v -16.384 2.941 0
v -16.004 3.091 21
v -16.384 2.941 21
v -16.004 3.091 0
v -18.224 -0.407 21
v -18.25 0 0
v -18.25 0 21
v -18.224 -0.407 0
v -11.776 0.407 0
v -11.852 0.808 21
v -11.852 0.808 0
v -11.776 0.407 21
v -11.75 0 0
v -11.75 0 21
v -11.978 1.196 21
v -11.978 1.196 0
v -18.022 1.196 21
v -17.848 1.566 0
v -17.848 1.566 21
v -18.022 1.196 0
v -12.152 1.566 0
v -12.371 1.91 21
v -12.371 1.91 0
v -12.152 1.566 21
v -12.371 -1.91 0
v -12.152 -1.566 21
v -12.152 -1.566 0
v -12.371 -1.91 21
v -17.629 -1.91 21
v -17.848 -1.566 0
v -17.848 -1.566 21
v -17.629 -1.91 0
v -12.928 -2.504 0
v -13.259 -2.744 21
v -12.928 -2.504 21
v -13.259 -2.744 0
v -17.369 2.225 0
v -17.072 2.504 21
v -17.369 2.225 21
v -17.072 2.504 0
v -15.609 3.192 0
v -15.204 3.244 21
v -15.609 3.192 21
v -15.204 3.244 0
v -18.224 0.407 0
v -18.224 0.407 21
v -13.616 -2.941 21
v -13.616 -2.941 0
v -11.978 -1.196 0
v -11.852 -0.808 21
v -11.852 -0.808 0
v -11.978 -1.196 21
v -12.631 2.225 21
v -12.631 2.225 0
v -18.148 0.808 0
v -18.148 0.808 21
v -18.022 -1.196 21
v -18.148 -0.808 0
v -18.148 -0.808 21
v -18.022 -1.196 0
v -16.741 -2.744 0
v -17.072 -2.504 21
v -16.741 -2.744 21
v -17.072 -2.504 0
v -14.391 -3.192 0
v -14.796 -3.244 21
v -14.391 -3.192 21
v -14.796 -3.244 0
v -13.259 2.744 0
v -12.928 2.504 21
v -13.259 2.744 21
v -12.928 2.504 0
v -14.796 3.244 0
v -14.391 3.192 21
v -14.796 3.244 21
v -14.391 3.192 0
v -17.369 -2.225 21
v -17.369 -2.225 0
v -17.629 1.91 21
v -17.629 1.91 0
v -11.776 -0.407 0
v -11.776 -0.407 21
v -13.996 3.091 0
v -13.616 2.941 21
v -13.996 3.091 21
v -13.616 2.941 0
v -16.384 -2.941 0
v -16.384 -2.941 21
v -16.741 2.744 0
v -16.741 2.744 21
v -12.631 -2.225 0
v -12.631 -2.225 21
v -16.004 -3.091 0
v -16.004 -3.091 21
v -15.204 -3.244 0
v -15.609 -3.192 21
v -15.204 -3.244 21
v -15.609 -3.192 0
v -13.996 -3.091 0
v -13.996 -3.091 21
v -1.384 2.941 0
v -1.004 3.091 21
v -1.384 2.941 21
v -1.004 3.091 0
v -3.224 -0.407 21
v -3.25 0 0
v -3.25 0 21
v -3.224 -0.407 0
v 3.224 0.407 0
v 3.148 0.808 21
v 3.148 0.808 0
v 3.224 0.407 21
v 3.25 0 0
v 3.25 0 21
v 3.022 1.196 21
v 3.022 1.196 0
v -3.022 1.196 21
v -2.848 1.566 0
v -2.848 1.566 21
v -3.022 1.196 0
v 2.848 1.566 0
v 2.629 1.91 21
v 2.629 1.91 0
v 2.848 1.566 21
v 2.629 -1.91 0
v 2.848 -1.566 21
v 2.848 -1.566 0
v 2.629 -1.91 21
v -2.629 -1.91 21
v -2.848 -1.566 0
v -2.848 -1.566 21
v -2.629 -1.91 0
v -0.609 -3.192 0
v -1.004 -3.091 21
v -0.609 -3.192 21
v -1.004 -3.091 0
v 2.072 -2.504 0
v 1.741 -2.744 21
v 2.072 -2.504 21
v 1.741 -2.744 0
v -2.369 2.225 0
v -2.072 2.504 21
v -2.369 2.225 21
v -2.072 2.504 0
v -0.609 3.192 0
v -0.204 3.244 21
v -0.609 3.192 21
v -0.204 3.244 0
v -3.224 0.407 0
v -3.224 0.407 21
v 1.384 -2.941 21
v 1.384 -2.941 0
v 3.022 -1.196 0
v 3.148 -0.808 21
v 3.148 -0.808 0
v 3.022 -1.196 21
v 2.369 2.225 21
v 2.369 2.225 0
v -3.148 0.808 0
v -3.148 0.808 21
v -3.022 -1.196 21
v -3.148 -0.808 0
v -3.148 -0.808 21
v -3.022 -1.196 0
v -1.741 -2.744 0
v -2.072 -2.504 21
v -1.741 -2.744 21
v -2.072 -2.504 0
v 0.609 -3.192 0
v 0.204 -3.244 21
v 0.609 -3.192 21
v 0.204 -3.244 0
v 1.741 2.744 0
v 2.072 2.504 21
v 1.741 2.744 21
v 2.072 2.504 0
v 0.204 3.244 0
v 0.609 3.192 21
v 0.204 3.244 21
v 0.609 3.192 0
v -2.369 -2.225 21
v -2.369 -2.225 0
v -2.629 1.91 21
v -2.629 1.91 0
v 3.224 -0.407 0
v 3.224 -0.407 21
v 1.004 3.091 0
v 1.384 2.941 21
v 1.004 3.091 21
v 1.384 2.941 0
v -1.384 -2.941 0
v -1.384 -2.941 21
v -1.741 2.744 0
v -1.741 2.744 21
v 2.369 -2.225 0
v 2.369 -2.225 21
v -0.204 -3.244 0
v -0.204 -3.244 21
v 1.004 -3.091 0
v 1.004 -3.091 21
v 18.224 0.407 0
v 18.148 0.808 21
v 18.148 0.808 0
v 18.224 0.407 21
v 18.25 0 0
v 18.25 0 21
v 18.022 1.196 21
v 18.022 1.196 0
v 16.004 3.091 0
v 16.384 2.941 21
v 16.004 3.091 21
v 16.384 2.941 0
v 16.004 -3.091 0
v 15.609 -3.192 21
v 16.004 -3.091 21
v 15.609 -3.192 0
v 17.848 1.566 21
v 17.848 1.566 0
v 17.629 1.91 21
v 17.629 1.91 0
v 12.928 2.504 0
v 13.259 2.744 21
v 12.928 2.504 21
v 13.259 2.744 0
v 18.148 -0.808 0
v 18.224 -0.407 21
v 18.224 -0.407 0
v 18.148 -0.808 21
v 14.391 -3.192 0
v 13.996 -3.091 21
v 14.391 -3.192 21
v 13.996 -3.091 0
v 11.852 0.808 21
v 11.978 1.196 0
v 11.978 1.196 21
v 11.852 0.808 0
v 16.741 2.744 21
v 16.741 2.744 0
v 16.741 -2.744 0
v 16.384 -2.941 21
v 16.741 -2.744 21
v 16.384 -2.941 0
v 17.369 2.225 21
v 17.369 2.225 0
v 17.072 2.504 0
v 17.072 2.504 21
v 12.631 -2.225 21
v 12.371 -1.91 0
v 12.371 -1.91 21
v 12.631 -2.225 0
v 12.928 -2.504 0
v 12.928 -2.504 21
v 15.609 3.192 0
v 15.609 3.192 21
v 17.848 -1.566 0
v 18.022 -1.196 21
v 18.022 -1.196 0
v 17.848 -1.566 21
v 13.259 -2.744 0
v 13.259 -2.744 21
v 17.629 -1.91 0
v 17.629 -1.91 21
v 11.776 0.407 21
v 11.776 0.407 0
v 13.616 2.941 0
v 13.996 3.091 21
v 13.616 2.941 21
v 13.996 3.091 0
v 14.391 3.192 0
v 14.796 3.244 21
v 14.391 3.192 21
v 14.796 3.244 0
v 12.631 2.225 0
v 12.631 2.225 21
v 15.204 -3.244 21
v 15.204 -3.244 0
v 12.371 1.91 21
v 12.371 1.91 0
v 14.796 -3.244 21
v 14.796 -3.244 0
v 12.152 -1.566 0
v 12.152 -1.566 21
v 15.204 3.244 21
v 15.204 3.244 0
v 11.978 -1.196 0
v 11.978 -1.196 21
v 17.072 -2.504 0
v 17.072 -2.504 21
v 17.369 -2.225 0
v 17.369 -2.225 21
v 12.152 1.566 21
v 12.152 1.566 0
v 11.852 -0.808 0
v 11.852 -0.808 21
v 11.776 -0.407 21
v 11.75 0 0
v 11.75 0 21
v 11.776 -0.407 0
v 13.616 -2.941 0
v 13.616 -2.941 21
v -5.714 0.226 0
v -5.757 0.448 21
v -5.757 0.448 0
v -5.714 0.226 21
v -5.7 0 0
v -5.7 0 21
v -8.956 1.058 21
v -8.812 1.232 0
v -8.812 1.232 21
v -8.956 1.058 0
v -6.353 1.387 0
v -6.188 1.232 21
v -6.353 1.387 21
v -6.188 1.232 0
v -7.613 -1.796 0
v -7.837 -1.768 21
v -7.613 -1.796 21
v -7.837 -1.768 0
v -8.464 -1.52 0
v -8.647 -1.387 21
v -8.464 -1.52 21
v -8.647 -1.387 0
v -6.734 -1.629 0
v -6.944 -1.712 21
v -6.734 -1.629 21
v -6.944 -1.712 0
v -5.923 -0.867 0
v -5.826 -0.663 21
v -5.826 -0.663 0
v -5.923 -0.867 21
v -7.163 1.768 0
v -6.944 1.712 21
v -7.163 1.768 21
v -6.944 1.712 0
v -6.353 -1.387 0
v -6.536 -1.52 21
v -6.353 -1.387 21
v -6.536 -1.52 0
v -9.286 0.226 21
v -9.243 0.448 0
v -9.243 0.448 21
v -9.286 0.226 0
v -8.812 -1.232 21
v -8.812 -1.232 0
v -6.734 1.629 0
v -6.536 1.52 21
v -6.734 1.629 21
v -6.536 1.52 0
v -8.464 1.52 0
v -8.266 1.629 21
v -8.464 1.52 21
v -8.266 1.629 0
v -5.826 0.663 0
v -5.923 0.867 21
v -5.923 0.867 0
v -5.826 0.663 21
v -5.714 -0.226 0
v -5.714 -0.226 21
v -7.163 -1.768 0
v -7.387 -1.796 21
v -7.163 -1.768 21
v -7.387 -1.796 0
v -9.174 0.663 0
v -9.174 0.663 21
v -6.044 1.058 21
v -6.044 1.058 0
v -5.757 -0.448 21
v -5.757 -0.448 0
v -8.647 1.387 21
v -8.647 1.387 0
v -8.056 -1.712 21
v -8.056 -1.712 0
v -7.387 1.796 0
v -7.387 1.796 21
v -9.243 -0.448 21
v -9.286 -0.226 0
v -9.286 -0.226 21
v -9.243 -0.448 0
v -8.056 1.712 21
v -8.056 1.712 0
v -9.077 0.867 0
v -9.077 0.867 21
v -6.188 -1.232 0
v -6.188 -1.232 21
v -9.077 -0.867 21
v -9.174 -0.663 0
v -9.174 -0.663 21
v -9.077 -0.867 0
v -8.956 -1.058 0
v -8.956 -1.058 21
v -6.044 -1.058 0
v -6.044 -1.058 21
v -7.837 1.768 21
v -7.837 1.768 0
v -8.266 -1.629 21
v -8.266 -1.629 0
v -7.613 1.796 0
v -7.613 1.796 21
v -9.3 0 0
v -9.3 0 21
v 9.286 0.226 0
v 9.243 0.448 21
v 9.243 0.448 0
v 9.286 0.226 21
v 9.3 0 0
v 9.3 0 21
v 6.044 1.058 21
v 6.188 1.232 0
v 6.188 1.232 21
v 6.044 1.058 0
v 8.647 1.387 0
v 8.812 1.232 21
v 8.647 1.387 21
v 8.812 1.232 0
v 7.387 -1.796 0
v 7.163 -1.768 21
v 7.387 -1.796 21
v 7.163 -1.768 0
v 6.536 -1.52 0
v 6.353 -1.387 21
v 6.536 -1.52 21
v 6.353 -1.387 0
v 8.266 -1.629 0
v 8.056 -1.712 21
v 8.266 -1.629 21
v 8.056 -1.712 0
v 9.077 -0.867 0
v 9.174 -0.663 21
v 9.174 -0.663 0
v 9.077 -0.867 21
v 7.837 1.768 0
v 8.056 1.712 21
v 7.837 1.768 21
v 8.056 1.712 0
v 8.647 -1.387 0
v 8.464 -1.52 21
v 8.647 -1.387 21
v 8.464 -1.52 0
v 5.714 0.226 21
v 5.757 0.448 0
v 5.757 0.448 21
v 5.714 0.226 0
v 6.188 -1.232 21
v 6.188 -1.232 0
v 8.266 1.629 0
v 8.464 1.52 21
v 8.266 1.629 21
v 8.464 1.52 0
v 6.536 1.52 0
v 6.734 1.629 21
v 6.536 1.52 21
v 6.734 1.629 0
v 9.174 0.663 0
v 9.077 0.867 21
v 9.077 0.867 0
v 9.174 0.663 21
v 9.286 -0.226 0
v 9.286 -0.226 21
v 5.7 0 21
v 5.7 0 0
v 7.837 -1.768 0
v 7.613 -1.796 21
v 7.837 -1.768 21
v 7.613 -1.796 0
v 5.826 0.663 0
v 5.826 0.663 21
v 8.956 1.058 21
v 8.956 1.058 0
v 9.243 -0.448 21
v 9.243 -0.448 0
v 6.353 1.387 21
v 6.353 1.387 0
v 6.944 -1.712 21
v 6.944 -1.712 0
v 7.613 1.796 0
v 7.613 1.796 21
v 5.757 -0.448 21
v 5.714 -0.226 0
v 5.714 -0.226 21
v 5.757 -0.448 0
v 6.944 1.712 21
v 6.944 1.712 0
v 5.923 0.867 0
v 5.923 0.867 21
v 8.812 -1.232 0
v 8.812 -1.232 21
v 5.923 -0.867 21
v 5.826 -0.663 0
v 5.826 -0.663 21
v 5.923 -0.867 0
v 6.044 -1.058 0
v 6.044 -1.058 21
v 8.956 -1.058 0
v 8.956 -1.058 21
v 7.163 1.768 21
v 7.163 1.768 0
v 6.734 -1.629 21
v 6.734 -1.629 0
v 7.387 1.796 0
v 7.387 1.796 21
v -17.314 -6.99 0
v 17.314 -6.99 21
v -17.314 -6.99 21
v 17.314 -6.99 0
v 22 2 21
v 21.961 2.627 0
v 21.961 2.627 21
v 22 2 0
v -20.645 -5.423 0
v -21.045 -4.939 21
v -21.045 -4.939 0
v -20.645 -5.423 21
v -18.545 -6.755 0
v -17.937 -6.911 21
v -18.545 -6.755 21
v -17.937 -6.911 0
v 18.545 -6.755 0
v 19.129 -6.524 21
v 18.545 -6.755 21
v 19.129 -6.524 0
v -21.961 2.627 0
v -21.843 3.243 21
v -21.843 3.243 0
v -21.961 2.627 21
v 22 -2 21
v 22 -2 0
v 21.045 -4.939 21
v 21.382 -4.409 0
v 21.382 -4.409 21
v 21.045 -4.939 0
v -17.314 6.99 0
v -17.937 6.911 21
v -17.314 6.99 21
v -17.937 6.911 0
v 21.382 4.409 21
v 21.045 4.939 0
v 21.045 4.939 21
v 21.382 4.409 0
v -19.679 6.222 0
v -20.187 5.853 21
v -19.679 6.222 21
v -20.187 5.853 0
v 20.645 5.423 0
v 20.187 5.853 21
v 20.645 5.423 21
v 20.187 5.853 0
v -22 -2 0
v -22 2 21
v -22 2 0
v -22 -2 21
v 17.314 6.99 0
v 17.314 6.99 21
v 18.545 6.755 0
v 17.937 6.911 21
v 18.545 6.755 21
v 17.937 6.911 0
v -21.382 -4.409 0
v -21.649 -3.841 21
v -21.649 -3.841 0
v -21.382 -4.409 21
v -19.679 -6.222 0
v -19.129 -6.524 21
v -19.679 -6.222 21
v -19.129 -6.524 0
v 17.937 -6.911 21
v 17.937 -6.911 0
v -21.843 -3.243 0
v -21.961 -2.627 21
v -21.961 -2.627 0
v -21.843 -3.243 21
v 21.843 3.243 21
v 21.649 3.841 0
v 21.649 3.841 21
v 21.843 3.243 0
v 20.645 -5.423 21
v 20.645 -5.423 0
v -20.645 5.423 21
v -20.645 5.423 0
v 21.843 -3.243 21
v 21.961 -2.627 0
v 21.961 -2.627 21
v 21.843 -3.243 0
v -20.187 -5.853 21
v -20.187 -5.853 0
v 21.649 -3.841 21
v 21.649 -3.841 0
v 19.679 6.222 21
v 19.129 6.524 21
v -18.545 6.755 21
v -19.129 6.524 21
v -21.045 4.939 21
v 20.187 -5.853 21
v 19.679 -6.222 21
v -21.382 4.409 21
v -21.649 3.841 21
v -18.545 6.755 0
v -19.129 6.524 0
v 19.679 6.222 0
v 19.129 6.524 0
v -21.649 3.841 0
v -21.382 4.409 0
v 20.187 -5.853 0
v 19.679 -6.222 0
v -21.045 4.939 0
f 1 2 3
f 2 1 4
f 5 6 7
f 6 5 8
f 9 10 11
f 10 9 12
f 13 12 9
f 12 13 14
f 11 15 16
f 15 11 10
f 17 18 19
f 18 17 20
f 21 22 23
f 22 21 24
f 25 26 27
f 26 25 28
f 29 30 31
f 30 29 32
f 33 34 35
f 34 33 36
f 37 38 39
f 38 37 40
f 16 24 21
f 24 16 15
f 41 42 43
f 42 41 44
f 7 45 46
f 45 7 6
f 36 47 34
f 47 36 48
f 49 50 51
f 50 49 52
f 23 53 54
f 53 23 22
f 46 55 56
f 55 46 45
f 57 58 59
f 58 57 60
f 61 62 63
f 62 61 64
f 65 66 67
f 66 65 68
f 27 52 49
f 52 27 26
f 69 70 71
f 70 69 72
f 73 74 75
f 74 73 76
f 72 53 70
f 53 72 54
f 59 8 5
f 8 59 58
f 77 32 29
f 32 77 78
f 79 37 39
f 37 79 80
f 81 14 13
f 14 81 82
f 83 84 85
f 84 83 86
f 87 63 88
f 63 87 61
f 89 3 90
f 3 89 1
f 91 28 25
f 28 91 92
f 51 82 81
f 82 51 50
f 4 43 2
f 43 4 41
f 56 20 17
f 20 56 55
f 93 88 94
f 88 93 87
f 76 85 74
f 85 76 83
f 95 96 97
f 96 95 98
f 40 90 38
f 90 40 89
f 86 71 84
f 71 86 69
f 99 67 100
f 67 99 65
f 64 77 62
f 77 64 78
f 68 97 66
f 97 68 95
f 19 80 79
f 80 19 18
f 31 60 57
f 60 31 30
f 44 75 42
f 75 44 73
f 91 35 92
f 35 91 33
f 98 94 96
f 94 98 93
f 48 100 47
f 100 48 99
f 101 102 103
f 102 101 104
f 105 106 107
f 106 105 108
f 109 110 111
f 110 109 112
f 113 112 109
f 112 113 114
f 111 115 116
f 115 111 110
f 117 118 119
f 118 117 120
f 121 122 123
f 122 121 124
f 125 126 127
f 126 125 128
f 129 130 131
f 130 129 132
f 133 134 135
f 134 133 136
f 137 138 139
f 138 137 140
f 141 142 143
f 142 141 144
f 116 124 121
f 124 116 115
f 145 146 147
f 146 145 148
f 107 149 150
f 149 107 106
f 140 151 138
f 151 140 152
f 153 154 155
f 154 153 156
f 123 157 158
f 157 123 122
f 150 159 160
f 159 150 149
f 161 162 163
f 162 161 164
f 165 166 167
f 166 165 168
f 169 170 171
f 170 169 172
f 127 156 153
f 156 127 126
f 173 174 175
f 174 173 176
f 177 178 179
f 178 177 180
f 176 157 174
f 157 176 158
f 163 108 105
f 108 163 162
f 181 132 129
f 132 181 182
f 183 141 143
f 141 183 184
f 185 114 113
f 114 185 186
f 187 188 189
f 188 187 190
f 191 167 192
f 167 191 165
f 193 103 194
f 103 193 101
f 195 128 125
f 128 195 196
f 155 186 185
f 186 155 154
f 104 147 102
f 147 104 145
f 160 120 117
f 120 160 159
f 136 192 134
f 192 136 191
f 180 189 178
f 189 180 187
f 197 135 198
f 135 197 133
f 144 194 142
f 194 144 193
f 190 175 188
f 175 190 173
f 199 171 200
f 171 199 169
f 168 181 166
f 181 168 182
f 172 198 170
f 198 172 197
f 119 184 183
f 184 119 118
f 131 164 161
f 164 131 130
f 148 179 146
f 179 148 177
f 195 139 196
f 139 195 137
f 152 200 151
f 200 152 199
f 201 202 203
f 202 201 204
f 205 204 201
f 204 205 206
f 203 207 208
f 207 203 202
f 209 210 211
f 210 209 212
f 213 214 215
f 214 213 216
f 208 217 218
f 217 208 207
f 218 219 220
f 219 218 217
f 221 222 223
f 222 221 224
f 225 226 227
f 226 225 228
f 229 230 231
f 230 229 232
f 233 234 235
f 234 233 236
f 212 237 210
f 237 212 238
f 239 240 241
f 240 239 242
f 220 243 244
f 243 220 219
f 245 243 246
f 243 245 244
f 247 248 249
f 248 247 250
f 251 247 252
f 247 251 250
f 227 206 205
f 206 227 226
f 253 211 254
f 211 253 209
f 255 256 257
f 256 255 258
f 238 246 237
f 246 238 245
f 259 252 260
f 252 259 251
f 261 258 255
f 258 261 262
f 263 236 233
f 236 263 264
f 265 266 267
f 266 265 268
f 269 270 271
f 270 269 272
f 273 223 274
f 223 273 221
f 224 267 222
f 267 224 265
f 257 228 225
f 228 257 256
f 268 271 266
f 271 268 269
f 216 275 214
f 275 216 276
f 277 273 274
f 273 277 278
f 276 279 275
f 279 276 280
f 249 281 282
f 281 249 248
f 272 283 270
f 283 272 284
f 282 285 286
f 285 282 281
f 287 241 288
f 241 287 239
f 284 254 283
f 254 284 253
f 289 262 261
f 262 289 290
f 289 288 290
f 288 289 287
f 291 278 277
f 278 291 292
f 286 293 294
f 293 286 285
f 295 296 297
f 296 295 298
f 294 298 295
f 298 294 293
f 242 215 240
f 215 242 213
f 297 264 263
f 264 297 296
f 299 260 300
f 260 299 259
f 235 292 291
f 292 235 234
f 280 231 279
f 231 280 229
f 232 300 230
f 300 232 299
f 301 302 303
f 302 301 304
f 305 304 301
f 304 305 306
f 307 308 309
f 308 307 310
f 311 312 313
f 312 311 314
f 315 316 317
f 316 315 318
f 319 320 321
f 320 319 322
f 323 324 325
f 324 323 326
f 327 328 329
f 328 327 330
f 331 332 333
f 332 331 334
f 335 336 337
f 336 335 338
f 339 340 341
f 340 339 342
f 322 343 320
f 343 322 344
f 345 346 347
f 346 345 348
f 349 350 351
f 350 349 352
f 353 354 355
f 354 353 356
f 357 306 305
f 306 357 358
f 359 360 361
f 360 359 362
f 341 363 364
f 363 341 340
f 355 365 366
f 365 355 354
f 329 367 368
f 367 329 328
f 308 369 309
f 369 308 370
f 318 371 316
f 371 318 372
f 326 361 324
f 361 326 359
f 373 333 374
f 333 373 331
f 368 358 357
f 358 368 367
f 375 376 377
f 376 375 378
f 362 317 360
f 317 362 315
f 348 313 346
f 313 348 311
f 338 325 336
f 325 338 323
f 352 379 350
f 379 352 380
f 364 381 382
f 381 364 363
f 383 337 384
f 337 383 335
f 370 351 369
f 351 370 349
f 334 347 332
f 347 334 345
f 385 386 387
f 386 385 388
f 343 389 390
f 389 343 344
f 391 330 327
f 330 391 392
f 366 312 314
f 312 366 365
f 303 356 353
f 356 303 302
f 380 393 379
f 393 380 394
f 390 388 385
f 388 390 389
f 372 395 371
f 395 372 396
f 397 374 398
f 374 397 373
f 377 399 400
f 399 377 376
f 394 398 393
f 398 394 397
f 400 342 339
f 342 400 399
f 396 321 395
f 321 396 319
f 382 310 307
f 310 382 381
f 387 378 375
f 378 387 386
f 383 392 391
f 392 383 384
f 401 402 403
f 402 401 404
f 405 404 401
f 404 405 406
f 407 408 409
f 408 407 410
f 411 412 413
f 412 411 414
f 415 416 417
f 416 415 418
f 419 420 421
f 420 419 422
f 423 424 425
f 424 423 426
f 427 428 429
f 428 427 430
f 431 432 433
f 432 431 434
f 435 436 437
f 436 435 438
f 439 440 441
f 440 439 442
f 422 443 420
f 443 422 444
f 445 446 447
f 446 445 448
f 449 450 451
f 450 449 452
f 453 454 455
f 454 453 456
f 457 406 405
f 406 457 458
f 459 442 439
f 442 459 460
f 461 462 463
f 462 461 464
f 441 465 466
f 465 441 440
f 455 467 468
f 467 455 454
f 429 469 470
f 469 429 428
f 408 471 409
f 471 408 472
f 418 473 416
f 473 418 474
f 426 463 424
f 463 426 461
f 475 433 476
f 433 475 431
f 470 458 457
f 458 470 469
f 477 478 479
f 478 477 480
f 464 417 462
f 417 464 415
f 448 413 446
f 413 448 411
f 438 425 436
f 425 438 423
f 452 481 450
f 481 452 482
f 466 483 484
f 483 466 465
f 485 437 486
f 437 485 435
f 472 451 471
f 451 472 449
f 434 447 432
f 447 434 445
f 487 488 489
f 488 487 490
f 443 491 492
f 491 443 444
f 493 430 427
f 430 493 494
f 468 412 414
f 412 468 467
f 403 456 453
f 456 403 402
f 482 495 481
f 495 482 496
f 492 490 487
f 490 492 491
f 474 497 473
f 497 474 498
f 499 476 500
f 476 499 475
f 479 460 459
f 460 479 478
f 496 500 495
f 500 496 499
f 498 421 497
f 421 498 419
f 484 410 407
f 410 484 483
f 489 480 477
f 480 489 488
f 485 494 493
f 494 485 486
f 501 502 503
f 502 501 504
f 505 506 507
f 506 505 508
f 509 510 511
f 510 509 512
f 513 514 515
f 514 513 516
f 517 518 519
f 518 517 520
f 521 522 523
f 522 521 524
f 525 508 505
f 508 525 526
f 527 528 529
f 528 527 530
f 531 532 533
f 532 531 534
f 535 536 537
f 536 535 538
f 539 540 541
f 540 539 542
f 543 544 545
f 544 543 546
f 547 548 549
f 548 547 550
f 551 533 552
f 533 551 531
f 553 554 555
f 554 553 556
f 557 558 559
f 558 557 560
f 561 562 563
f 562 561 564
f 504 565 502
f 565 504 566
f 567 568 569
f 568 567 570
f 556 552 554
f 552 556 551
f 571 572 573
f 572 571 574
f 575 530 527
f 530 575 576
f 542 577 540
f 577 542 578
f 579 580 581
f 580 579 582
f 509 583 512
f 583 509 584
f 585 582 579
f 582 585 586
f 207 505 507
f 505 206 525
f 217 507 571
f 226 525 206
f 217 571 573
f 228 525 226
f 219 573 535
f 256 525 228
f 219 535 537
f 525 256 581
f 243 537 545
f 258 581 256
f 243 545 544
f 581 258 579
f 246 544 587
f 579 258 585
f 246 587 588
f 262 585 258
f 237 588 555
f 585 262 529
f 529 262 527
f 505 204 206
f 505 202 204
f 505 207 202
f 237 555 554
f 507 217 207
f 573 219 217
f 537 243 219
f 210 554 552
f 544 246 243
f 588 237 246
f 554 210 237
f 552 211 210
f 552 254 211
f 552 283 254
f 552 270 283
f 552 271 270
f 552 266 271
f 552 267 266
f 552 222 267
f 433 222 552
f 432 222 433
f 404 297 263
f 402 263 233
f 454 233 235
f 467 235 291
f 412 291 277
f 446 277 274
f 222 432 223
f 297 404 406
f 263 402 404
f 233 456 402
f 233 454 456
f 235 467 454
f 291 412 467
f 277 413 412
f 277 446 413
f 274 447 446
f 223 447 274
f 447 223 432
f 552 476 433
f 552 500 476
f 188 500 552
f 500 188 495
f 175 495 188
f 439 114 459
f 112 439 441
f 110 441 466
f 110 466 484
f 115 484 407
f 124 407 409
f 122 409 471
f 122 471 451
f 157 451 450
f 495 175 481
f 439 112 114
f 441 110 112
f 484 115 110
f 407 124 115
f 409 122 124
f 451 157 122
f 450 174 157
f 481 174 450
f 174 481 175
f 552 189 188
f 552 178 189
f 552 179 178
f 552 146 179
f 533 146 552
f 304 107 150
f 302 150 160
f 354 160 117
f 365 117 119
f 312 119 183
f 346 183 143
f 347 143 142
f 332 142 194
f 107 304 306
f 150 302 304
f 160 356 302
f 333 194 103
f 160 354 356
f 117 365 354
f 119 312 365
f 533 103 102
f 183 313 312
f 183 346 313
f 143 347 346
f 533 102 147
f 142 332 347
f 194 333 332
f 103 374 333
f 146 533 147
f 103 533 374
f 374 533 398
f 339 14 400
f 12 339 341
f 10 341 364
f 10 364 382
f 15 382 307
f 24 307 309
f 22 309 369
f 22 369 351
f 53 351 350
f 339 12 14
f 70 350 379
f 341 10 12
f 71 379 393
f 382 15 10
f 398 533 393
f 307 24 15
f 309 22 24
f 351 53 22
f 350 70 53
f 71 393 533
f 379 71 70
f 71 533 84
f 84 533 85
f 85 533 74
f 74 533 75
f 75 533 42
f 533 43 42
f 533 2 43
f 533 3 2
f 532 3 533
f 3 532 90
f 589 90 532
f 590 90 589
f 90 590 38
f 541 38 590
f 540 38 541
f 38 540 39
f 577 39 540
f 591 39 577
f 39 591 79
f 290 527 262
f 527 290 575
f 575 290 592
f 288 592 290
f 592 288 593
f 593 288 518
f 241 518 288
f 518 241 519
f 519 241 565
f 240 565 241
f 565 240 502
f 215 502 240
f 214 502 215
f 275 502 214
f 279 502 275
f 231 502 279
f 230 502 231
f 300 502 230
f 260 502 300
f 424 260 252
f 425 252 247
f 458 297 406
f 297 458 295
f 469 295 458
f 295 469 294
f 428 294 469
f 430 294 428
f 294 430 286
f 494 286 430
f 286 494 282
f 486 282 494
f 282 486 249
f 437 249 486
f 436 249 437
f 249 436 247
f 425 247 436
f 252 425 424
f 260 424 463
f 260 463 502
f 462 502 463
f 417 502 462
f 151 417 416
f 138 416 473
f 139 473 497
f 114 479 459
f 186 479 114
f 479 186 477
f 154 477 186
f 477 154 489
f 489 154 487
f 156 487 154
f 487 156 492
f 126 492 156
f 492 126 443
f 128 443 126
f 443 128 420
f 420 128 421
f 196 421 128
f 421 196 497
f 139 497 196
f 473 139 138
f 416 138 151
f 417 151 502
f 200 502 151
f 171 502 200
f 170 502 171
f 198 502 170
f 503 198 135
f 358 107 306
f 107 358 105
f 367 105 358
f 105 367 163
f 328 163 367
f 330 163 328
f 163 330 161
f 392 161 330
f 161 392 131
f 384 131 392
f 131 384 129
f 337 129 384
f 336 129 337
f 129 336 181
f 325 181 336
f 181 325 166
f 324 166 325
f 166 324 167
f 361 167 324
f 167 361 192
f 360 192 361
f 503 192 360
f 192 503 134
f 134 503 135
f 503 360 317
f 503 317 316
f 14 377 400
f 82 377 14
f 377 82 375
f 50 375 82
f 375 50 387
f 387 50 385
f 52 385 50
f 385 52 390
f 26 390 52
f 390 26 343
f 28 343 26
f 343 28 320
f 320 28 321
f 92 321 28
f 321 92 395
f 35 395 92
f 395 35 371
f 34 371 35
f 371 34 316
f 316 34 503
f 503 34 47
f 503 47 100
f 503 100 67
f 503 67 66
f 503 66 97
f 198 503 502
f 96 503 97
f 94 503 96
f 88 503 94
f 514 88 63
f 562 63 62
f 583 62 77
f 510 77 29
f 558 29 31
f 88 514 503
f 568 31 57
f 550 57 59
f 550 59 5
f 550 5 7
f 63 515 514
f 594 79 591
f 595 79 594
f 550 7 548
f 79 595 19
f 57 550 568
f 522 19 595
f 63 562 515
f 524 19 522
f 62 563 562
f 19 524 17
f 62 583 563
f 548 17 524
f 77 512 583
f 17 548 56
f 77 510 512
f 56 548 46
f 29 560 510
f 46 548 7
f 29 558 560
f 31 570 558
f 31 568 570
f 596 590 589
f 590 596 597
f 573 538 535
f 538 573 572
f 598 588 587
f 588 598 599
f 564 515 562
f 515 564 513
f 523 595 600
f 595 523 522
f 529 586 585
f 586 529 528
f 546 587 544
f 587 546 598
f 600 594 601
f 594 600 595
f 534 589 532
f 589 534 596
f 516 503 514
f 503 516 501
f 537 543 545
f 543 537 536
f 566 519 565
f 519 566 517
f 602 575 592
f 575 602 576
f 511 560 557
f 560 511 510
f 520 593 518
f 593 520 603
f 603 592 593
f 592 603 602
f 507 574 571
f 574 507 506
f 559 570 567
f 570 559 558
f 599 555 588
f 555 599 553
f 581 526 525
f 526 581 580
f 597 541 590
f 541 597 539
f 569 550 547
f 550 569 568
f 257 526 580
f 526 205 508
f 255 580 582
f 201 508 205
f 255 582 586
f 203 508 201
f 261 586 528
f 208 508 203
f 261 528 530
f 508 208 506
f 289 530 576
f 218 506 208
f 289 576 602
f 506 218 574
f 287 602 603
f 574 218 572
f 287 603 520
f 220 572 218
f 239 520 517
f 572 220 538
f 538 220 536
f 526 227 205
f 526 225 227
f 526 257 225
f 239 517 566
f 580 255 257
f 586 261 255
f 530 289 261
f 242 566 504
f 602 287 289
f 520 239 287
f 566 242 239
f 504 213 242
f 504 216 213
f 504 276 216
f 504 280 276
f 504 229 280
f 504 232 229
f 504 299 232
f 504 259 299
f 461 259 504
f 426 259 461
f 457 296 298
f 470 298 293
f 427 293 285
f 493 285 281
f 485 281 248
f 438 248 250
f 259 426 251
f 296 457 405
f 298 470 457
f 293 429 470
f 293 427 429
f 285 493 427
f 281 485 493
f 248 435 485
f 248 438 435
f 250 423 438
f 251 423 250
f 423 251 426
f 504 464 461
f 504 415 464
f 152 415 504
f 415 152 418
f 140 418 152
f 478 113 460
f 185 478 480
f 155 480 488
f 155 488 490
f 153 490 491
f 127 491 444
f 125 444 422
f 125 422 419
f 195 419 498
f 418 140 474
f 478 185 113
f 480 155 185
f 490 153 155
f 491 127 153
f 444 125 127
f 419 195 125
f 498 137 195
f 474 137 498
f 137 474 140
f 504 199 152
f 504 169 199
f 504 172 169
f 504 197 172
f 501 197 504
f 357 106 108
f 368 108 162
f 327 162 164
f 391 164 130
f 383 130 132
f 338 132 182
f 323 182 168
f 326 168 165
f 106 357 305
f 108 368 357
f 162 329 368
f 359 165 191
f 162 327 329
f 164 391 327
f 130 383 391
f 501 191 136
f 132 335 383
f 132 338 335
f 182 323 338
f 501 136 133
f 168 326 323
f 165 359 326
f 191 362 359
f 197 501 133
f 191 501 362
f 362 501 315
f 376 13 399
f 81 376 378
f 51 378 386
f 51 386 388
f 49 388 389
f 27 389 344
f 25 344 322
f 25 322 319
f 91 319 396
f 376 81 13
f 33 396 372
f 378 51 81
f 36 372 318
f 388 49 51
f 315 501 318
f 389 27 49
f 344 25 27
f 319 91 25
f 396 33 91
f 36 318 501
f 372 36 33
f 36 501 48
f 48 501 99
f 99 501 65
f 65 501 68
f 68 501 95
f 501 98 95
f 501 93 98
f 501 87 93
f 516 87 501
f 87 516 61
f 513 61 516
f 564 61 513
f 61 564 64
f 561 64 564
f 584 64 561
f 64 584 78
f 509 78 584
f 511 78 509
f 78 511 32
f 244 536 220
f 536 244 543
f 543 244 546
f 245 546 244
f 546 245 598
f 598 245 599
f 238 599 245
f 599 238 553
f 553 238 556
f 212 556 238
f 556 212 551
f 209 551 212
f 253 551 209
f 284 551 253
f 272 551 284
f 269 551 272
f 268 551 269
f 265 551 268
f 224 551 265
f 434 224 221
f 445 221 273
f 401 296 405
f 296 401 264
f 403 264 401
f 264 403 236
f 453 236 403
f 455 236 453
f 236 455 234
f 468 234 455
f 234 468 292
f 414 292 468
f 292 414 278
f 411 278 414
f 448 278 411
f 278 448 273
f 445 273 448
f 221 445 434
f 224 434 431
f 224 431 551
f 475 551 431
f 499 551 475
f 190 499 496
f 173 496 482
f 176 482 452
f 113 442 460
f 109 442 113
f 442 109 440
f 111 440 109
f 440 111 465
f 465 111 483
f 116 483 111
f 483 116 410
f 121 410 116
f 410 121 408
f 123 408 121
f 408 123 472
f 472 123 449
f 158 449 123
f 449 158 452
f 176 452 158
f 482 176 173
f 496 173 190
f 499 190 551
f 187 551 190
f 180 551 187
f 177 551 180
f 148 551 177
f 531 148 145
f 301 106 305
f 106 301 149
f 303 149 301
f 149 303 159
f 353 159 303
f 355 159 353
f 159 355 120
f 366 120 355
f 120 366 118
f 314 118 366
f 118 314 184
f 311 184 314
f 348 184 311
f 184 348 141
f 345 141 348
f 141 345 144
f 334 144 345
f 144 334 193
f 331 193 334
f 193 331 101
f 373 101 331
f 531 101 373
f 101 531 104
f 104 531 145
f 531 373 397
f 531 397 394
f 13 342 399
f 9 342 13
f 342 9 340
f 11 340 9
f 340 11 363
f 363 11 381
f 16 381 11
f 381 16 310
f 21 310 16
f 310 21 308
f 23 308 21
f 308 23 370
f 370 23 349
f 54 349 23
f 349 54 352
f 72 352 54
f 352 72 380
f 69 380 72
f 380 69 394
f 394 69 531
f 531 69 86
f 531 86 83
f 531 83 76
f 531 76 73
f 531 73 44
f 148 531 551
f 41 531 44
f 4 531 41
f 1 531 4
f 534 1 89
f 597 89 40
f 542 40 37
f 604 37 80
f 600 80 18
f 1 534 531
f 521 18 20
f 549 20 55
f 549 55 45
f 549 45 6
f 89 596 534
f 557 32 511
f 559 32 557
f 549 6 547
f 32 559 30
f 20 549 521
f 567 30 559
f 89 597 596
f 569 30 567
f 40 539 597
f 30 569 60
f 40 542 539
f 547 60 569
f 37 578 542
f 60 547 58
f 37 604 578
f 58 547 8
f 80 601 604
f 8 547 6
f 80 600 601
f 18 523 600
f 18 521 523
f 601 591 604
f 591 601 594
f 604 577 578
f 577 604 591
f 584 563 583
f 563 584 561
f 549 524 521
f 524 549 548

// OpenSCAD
$fn = 50;


difference() {
	union() {
		hull() {
			translate(v = [-17.0000000000, 2.0000000000, 0]) {
				cylinder(h = 21, r = 5);
			}
			translate(v = [17.0000000000, 2.0000000000, 0]) {
				cylinder(h = 21, r = 5);
			}
			translate(v = [-17.0000000000, -2.0000000000, 0]) {
				cylinder(h = 21, r = 5);
			}
			translate(v = [17.0000000000, -2.0000000000, 0]) {
				cylinder(h = 21, r = 5);
			}
		}
	}
	union() {
		translate(v = [-15.0000000000, 0.0000000000, 0]) {
			translate(v = [0, 0, -100]) {
				cylinder(h = 200, r = 3.2500000000);
			}
		}
		translate(v = [0, 0, -100]) {
			cylinder(h = 200, r = 3.2500000000);
		}
		translate(v = [15.0000000000, 0.0000000000, 0]) {
			translate(v = [0, 0, -100]) {
				cylinder(h = 200, r = 3.2500000000);
			}
		}
		translate(v = [-15.0000000000, 0.0000000000, 0]) {
			translate(v = [0, 0, -100]) {
				cylinder(h = 200, r = 1.8000000000);
			}
		}
		translate(v = [-7.5000000000, 0.0000000000, 0]) {
			translate(v = [0, 0, -100]) {
				cylinder(h = 200, r = 1.8000000000);
			}
		}
		translate(v = [0, 0, -100]) {
			cylinder(h = 200, r = 1.8000000000);
		}
		translate(v = [7.5000000000, 0.0000000000, 0]) {
			translate(v = [0, 0, -100]) {
				cylinder(h = 200, r = 1.8000000000);
			}
		}
		translate(v = [15.0000000000, 0.0000000000, 0]) {
			translate(v = [0, 0, -100]) {
				cylinder(h = 200, r = 1.8000000000);
			}
		}
	}
}
